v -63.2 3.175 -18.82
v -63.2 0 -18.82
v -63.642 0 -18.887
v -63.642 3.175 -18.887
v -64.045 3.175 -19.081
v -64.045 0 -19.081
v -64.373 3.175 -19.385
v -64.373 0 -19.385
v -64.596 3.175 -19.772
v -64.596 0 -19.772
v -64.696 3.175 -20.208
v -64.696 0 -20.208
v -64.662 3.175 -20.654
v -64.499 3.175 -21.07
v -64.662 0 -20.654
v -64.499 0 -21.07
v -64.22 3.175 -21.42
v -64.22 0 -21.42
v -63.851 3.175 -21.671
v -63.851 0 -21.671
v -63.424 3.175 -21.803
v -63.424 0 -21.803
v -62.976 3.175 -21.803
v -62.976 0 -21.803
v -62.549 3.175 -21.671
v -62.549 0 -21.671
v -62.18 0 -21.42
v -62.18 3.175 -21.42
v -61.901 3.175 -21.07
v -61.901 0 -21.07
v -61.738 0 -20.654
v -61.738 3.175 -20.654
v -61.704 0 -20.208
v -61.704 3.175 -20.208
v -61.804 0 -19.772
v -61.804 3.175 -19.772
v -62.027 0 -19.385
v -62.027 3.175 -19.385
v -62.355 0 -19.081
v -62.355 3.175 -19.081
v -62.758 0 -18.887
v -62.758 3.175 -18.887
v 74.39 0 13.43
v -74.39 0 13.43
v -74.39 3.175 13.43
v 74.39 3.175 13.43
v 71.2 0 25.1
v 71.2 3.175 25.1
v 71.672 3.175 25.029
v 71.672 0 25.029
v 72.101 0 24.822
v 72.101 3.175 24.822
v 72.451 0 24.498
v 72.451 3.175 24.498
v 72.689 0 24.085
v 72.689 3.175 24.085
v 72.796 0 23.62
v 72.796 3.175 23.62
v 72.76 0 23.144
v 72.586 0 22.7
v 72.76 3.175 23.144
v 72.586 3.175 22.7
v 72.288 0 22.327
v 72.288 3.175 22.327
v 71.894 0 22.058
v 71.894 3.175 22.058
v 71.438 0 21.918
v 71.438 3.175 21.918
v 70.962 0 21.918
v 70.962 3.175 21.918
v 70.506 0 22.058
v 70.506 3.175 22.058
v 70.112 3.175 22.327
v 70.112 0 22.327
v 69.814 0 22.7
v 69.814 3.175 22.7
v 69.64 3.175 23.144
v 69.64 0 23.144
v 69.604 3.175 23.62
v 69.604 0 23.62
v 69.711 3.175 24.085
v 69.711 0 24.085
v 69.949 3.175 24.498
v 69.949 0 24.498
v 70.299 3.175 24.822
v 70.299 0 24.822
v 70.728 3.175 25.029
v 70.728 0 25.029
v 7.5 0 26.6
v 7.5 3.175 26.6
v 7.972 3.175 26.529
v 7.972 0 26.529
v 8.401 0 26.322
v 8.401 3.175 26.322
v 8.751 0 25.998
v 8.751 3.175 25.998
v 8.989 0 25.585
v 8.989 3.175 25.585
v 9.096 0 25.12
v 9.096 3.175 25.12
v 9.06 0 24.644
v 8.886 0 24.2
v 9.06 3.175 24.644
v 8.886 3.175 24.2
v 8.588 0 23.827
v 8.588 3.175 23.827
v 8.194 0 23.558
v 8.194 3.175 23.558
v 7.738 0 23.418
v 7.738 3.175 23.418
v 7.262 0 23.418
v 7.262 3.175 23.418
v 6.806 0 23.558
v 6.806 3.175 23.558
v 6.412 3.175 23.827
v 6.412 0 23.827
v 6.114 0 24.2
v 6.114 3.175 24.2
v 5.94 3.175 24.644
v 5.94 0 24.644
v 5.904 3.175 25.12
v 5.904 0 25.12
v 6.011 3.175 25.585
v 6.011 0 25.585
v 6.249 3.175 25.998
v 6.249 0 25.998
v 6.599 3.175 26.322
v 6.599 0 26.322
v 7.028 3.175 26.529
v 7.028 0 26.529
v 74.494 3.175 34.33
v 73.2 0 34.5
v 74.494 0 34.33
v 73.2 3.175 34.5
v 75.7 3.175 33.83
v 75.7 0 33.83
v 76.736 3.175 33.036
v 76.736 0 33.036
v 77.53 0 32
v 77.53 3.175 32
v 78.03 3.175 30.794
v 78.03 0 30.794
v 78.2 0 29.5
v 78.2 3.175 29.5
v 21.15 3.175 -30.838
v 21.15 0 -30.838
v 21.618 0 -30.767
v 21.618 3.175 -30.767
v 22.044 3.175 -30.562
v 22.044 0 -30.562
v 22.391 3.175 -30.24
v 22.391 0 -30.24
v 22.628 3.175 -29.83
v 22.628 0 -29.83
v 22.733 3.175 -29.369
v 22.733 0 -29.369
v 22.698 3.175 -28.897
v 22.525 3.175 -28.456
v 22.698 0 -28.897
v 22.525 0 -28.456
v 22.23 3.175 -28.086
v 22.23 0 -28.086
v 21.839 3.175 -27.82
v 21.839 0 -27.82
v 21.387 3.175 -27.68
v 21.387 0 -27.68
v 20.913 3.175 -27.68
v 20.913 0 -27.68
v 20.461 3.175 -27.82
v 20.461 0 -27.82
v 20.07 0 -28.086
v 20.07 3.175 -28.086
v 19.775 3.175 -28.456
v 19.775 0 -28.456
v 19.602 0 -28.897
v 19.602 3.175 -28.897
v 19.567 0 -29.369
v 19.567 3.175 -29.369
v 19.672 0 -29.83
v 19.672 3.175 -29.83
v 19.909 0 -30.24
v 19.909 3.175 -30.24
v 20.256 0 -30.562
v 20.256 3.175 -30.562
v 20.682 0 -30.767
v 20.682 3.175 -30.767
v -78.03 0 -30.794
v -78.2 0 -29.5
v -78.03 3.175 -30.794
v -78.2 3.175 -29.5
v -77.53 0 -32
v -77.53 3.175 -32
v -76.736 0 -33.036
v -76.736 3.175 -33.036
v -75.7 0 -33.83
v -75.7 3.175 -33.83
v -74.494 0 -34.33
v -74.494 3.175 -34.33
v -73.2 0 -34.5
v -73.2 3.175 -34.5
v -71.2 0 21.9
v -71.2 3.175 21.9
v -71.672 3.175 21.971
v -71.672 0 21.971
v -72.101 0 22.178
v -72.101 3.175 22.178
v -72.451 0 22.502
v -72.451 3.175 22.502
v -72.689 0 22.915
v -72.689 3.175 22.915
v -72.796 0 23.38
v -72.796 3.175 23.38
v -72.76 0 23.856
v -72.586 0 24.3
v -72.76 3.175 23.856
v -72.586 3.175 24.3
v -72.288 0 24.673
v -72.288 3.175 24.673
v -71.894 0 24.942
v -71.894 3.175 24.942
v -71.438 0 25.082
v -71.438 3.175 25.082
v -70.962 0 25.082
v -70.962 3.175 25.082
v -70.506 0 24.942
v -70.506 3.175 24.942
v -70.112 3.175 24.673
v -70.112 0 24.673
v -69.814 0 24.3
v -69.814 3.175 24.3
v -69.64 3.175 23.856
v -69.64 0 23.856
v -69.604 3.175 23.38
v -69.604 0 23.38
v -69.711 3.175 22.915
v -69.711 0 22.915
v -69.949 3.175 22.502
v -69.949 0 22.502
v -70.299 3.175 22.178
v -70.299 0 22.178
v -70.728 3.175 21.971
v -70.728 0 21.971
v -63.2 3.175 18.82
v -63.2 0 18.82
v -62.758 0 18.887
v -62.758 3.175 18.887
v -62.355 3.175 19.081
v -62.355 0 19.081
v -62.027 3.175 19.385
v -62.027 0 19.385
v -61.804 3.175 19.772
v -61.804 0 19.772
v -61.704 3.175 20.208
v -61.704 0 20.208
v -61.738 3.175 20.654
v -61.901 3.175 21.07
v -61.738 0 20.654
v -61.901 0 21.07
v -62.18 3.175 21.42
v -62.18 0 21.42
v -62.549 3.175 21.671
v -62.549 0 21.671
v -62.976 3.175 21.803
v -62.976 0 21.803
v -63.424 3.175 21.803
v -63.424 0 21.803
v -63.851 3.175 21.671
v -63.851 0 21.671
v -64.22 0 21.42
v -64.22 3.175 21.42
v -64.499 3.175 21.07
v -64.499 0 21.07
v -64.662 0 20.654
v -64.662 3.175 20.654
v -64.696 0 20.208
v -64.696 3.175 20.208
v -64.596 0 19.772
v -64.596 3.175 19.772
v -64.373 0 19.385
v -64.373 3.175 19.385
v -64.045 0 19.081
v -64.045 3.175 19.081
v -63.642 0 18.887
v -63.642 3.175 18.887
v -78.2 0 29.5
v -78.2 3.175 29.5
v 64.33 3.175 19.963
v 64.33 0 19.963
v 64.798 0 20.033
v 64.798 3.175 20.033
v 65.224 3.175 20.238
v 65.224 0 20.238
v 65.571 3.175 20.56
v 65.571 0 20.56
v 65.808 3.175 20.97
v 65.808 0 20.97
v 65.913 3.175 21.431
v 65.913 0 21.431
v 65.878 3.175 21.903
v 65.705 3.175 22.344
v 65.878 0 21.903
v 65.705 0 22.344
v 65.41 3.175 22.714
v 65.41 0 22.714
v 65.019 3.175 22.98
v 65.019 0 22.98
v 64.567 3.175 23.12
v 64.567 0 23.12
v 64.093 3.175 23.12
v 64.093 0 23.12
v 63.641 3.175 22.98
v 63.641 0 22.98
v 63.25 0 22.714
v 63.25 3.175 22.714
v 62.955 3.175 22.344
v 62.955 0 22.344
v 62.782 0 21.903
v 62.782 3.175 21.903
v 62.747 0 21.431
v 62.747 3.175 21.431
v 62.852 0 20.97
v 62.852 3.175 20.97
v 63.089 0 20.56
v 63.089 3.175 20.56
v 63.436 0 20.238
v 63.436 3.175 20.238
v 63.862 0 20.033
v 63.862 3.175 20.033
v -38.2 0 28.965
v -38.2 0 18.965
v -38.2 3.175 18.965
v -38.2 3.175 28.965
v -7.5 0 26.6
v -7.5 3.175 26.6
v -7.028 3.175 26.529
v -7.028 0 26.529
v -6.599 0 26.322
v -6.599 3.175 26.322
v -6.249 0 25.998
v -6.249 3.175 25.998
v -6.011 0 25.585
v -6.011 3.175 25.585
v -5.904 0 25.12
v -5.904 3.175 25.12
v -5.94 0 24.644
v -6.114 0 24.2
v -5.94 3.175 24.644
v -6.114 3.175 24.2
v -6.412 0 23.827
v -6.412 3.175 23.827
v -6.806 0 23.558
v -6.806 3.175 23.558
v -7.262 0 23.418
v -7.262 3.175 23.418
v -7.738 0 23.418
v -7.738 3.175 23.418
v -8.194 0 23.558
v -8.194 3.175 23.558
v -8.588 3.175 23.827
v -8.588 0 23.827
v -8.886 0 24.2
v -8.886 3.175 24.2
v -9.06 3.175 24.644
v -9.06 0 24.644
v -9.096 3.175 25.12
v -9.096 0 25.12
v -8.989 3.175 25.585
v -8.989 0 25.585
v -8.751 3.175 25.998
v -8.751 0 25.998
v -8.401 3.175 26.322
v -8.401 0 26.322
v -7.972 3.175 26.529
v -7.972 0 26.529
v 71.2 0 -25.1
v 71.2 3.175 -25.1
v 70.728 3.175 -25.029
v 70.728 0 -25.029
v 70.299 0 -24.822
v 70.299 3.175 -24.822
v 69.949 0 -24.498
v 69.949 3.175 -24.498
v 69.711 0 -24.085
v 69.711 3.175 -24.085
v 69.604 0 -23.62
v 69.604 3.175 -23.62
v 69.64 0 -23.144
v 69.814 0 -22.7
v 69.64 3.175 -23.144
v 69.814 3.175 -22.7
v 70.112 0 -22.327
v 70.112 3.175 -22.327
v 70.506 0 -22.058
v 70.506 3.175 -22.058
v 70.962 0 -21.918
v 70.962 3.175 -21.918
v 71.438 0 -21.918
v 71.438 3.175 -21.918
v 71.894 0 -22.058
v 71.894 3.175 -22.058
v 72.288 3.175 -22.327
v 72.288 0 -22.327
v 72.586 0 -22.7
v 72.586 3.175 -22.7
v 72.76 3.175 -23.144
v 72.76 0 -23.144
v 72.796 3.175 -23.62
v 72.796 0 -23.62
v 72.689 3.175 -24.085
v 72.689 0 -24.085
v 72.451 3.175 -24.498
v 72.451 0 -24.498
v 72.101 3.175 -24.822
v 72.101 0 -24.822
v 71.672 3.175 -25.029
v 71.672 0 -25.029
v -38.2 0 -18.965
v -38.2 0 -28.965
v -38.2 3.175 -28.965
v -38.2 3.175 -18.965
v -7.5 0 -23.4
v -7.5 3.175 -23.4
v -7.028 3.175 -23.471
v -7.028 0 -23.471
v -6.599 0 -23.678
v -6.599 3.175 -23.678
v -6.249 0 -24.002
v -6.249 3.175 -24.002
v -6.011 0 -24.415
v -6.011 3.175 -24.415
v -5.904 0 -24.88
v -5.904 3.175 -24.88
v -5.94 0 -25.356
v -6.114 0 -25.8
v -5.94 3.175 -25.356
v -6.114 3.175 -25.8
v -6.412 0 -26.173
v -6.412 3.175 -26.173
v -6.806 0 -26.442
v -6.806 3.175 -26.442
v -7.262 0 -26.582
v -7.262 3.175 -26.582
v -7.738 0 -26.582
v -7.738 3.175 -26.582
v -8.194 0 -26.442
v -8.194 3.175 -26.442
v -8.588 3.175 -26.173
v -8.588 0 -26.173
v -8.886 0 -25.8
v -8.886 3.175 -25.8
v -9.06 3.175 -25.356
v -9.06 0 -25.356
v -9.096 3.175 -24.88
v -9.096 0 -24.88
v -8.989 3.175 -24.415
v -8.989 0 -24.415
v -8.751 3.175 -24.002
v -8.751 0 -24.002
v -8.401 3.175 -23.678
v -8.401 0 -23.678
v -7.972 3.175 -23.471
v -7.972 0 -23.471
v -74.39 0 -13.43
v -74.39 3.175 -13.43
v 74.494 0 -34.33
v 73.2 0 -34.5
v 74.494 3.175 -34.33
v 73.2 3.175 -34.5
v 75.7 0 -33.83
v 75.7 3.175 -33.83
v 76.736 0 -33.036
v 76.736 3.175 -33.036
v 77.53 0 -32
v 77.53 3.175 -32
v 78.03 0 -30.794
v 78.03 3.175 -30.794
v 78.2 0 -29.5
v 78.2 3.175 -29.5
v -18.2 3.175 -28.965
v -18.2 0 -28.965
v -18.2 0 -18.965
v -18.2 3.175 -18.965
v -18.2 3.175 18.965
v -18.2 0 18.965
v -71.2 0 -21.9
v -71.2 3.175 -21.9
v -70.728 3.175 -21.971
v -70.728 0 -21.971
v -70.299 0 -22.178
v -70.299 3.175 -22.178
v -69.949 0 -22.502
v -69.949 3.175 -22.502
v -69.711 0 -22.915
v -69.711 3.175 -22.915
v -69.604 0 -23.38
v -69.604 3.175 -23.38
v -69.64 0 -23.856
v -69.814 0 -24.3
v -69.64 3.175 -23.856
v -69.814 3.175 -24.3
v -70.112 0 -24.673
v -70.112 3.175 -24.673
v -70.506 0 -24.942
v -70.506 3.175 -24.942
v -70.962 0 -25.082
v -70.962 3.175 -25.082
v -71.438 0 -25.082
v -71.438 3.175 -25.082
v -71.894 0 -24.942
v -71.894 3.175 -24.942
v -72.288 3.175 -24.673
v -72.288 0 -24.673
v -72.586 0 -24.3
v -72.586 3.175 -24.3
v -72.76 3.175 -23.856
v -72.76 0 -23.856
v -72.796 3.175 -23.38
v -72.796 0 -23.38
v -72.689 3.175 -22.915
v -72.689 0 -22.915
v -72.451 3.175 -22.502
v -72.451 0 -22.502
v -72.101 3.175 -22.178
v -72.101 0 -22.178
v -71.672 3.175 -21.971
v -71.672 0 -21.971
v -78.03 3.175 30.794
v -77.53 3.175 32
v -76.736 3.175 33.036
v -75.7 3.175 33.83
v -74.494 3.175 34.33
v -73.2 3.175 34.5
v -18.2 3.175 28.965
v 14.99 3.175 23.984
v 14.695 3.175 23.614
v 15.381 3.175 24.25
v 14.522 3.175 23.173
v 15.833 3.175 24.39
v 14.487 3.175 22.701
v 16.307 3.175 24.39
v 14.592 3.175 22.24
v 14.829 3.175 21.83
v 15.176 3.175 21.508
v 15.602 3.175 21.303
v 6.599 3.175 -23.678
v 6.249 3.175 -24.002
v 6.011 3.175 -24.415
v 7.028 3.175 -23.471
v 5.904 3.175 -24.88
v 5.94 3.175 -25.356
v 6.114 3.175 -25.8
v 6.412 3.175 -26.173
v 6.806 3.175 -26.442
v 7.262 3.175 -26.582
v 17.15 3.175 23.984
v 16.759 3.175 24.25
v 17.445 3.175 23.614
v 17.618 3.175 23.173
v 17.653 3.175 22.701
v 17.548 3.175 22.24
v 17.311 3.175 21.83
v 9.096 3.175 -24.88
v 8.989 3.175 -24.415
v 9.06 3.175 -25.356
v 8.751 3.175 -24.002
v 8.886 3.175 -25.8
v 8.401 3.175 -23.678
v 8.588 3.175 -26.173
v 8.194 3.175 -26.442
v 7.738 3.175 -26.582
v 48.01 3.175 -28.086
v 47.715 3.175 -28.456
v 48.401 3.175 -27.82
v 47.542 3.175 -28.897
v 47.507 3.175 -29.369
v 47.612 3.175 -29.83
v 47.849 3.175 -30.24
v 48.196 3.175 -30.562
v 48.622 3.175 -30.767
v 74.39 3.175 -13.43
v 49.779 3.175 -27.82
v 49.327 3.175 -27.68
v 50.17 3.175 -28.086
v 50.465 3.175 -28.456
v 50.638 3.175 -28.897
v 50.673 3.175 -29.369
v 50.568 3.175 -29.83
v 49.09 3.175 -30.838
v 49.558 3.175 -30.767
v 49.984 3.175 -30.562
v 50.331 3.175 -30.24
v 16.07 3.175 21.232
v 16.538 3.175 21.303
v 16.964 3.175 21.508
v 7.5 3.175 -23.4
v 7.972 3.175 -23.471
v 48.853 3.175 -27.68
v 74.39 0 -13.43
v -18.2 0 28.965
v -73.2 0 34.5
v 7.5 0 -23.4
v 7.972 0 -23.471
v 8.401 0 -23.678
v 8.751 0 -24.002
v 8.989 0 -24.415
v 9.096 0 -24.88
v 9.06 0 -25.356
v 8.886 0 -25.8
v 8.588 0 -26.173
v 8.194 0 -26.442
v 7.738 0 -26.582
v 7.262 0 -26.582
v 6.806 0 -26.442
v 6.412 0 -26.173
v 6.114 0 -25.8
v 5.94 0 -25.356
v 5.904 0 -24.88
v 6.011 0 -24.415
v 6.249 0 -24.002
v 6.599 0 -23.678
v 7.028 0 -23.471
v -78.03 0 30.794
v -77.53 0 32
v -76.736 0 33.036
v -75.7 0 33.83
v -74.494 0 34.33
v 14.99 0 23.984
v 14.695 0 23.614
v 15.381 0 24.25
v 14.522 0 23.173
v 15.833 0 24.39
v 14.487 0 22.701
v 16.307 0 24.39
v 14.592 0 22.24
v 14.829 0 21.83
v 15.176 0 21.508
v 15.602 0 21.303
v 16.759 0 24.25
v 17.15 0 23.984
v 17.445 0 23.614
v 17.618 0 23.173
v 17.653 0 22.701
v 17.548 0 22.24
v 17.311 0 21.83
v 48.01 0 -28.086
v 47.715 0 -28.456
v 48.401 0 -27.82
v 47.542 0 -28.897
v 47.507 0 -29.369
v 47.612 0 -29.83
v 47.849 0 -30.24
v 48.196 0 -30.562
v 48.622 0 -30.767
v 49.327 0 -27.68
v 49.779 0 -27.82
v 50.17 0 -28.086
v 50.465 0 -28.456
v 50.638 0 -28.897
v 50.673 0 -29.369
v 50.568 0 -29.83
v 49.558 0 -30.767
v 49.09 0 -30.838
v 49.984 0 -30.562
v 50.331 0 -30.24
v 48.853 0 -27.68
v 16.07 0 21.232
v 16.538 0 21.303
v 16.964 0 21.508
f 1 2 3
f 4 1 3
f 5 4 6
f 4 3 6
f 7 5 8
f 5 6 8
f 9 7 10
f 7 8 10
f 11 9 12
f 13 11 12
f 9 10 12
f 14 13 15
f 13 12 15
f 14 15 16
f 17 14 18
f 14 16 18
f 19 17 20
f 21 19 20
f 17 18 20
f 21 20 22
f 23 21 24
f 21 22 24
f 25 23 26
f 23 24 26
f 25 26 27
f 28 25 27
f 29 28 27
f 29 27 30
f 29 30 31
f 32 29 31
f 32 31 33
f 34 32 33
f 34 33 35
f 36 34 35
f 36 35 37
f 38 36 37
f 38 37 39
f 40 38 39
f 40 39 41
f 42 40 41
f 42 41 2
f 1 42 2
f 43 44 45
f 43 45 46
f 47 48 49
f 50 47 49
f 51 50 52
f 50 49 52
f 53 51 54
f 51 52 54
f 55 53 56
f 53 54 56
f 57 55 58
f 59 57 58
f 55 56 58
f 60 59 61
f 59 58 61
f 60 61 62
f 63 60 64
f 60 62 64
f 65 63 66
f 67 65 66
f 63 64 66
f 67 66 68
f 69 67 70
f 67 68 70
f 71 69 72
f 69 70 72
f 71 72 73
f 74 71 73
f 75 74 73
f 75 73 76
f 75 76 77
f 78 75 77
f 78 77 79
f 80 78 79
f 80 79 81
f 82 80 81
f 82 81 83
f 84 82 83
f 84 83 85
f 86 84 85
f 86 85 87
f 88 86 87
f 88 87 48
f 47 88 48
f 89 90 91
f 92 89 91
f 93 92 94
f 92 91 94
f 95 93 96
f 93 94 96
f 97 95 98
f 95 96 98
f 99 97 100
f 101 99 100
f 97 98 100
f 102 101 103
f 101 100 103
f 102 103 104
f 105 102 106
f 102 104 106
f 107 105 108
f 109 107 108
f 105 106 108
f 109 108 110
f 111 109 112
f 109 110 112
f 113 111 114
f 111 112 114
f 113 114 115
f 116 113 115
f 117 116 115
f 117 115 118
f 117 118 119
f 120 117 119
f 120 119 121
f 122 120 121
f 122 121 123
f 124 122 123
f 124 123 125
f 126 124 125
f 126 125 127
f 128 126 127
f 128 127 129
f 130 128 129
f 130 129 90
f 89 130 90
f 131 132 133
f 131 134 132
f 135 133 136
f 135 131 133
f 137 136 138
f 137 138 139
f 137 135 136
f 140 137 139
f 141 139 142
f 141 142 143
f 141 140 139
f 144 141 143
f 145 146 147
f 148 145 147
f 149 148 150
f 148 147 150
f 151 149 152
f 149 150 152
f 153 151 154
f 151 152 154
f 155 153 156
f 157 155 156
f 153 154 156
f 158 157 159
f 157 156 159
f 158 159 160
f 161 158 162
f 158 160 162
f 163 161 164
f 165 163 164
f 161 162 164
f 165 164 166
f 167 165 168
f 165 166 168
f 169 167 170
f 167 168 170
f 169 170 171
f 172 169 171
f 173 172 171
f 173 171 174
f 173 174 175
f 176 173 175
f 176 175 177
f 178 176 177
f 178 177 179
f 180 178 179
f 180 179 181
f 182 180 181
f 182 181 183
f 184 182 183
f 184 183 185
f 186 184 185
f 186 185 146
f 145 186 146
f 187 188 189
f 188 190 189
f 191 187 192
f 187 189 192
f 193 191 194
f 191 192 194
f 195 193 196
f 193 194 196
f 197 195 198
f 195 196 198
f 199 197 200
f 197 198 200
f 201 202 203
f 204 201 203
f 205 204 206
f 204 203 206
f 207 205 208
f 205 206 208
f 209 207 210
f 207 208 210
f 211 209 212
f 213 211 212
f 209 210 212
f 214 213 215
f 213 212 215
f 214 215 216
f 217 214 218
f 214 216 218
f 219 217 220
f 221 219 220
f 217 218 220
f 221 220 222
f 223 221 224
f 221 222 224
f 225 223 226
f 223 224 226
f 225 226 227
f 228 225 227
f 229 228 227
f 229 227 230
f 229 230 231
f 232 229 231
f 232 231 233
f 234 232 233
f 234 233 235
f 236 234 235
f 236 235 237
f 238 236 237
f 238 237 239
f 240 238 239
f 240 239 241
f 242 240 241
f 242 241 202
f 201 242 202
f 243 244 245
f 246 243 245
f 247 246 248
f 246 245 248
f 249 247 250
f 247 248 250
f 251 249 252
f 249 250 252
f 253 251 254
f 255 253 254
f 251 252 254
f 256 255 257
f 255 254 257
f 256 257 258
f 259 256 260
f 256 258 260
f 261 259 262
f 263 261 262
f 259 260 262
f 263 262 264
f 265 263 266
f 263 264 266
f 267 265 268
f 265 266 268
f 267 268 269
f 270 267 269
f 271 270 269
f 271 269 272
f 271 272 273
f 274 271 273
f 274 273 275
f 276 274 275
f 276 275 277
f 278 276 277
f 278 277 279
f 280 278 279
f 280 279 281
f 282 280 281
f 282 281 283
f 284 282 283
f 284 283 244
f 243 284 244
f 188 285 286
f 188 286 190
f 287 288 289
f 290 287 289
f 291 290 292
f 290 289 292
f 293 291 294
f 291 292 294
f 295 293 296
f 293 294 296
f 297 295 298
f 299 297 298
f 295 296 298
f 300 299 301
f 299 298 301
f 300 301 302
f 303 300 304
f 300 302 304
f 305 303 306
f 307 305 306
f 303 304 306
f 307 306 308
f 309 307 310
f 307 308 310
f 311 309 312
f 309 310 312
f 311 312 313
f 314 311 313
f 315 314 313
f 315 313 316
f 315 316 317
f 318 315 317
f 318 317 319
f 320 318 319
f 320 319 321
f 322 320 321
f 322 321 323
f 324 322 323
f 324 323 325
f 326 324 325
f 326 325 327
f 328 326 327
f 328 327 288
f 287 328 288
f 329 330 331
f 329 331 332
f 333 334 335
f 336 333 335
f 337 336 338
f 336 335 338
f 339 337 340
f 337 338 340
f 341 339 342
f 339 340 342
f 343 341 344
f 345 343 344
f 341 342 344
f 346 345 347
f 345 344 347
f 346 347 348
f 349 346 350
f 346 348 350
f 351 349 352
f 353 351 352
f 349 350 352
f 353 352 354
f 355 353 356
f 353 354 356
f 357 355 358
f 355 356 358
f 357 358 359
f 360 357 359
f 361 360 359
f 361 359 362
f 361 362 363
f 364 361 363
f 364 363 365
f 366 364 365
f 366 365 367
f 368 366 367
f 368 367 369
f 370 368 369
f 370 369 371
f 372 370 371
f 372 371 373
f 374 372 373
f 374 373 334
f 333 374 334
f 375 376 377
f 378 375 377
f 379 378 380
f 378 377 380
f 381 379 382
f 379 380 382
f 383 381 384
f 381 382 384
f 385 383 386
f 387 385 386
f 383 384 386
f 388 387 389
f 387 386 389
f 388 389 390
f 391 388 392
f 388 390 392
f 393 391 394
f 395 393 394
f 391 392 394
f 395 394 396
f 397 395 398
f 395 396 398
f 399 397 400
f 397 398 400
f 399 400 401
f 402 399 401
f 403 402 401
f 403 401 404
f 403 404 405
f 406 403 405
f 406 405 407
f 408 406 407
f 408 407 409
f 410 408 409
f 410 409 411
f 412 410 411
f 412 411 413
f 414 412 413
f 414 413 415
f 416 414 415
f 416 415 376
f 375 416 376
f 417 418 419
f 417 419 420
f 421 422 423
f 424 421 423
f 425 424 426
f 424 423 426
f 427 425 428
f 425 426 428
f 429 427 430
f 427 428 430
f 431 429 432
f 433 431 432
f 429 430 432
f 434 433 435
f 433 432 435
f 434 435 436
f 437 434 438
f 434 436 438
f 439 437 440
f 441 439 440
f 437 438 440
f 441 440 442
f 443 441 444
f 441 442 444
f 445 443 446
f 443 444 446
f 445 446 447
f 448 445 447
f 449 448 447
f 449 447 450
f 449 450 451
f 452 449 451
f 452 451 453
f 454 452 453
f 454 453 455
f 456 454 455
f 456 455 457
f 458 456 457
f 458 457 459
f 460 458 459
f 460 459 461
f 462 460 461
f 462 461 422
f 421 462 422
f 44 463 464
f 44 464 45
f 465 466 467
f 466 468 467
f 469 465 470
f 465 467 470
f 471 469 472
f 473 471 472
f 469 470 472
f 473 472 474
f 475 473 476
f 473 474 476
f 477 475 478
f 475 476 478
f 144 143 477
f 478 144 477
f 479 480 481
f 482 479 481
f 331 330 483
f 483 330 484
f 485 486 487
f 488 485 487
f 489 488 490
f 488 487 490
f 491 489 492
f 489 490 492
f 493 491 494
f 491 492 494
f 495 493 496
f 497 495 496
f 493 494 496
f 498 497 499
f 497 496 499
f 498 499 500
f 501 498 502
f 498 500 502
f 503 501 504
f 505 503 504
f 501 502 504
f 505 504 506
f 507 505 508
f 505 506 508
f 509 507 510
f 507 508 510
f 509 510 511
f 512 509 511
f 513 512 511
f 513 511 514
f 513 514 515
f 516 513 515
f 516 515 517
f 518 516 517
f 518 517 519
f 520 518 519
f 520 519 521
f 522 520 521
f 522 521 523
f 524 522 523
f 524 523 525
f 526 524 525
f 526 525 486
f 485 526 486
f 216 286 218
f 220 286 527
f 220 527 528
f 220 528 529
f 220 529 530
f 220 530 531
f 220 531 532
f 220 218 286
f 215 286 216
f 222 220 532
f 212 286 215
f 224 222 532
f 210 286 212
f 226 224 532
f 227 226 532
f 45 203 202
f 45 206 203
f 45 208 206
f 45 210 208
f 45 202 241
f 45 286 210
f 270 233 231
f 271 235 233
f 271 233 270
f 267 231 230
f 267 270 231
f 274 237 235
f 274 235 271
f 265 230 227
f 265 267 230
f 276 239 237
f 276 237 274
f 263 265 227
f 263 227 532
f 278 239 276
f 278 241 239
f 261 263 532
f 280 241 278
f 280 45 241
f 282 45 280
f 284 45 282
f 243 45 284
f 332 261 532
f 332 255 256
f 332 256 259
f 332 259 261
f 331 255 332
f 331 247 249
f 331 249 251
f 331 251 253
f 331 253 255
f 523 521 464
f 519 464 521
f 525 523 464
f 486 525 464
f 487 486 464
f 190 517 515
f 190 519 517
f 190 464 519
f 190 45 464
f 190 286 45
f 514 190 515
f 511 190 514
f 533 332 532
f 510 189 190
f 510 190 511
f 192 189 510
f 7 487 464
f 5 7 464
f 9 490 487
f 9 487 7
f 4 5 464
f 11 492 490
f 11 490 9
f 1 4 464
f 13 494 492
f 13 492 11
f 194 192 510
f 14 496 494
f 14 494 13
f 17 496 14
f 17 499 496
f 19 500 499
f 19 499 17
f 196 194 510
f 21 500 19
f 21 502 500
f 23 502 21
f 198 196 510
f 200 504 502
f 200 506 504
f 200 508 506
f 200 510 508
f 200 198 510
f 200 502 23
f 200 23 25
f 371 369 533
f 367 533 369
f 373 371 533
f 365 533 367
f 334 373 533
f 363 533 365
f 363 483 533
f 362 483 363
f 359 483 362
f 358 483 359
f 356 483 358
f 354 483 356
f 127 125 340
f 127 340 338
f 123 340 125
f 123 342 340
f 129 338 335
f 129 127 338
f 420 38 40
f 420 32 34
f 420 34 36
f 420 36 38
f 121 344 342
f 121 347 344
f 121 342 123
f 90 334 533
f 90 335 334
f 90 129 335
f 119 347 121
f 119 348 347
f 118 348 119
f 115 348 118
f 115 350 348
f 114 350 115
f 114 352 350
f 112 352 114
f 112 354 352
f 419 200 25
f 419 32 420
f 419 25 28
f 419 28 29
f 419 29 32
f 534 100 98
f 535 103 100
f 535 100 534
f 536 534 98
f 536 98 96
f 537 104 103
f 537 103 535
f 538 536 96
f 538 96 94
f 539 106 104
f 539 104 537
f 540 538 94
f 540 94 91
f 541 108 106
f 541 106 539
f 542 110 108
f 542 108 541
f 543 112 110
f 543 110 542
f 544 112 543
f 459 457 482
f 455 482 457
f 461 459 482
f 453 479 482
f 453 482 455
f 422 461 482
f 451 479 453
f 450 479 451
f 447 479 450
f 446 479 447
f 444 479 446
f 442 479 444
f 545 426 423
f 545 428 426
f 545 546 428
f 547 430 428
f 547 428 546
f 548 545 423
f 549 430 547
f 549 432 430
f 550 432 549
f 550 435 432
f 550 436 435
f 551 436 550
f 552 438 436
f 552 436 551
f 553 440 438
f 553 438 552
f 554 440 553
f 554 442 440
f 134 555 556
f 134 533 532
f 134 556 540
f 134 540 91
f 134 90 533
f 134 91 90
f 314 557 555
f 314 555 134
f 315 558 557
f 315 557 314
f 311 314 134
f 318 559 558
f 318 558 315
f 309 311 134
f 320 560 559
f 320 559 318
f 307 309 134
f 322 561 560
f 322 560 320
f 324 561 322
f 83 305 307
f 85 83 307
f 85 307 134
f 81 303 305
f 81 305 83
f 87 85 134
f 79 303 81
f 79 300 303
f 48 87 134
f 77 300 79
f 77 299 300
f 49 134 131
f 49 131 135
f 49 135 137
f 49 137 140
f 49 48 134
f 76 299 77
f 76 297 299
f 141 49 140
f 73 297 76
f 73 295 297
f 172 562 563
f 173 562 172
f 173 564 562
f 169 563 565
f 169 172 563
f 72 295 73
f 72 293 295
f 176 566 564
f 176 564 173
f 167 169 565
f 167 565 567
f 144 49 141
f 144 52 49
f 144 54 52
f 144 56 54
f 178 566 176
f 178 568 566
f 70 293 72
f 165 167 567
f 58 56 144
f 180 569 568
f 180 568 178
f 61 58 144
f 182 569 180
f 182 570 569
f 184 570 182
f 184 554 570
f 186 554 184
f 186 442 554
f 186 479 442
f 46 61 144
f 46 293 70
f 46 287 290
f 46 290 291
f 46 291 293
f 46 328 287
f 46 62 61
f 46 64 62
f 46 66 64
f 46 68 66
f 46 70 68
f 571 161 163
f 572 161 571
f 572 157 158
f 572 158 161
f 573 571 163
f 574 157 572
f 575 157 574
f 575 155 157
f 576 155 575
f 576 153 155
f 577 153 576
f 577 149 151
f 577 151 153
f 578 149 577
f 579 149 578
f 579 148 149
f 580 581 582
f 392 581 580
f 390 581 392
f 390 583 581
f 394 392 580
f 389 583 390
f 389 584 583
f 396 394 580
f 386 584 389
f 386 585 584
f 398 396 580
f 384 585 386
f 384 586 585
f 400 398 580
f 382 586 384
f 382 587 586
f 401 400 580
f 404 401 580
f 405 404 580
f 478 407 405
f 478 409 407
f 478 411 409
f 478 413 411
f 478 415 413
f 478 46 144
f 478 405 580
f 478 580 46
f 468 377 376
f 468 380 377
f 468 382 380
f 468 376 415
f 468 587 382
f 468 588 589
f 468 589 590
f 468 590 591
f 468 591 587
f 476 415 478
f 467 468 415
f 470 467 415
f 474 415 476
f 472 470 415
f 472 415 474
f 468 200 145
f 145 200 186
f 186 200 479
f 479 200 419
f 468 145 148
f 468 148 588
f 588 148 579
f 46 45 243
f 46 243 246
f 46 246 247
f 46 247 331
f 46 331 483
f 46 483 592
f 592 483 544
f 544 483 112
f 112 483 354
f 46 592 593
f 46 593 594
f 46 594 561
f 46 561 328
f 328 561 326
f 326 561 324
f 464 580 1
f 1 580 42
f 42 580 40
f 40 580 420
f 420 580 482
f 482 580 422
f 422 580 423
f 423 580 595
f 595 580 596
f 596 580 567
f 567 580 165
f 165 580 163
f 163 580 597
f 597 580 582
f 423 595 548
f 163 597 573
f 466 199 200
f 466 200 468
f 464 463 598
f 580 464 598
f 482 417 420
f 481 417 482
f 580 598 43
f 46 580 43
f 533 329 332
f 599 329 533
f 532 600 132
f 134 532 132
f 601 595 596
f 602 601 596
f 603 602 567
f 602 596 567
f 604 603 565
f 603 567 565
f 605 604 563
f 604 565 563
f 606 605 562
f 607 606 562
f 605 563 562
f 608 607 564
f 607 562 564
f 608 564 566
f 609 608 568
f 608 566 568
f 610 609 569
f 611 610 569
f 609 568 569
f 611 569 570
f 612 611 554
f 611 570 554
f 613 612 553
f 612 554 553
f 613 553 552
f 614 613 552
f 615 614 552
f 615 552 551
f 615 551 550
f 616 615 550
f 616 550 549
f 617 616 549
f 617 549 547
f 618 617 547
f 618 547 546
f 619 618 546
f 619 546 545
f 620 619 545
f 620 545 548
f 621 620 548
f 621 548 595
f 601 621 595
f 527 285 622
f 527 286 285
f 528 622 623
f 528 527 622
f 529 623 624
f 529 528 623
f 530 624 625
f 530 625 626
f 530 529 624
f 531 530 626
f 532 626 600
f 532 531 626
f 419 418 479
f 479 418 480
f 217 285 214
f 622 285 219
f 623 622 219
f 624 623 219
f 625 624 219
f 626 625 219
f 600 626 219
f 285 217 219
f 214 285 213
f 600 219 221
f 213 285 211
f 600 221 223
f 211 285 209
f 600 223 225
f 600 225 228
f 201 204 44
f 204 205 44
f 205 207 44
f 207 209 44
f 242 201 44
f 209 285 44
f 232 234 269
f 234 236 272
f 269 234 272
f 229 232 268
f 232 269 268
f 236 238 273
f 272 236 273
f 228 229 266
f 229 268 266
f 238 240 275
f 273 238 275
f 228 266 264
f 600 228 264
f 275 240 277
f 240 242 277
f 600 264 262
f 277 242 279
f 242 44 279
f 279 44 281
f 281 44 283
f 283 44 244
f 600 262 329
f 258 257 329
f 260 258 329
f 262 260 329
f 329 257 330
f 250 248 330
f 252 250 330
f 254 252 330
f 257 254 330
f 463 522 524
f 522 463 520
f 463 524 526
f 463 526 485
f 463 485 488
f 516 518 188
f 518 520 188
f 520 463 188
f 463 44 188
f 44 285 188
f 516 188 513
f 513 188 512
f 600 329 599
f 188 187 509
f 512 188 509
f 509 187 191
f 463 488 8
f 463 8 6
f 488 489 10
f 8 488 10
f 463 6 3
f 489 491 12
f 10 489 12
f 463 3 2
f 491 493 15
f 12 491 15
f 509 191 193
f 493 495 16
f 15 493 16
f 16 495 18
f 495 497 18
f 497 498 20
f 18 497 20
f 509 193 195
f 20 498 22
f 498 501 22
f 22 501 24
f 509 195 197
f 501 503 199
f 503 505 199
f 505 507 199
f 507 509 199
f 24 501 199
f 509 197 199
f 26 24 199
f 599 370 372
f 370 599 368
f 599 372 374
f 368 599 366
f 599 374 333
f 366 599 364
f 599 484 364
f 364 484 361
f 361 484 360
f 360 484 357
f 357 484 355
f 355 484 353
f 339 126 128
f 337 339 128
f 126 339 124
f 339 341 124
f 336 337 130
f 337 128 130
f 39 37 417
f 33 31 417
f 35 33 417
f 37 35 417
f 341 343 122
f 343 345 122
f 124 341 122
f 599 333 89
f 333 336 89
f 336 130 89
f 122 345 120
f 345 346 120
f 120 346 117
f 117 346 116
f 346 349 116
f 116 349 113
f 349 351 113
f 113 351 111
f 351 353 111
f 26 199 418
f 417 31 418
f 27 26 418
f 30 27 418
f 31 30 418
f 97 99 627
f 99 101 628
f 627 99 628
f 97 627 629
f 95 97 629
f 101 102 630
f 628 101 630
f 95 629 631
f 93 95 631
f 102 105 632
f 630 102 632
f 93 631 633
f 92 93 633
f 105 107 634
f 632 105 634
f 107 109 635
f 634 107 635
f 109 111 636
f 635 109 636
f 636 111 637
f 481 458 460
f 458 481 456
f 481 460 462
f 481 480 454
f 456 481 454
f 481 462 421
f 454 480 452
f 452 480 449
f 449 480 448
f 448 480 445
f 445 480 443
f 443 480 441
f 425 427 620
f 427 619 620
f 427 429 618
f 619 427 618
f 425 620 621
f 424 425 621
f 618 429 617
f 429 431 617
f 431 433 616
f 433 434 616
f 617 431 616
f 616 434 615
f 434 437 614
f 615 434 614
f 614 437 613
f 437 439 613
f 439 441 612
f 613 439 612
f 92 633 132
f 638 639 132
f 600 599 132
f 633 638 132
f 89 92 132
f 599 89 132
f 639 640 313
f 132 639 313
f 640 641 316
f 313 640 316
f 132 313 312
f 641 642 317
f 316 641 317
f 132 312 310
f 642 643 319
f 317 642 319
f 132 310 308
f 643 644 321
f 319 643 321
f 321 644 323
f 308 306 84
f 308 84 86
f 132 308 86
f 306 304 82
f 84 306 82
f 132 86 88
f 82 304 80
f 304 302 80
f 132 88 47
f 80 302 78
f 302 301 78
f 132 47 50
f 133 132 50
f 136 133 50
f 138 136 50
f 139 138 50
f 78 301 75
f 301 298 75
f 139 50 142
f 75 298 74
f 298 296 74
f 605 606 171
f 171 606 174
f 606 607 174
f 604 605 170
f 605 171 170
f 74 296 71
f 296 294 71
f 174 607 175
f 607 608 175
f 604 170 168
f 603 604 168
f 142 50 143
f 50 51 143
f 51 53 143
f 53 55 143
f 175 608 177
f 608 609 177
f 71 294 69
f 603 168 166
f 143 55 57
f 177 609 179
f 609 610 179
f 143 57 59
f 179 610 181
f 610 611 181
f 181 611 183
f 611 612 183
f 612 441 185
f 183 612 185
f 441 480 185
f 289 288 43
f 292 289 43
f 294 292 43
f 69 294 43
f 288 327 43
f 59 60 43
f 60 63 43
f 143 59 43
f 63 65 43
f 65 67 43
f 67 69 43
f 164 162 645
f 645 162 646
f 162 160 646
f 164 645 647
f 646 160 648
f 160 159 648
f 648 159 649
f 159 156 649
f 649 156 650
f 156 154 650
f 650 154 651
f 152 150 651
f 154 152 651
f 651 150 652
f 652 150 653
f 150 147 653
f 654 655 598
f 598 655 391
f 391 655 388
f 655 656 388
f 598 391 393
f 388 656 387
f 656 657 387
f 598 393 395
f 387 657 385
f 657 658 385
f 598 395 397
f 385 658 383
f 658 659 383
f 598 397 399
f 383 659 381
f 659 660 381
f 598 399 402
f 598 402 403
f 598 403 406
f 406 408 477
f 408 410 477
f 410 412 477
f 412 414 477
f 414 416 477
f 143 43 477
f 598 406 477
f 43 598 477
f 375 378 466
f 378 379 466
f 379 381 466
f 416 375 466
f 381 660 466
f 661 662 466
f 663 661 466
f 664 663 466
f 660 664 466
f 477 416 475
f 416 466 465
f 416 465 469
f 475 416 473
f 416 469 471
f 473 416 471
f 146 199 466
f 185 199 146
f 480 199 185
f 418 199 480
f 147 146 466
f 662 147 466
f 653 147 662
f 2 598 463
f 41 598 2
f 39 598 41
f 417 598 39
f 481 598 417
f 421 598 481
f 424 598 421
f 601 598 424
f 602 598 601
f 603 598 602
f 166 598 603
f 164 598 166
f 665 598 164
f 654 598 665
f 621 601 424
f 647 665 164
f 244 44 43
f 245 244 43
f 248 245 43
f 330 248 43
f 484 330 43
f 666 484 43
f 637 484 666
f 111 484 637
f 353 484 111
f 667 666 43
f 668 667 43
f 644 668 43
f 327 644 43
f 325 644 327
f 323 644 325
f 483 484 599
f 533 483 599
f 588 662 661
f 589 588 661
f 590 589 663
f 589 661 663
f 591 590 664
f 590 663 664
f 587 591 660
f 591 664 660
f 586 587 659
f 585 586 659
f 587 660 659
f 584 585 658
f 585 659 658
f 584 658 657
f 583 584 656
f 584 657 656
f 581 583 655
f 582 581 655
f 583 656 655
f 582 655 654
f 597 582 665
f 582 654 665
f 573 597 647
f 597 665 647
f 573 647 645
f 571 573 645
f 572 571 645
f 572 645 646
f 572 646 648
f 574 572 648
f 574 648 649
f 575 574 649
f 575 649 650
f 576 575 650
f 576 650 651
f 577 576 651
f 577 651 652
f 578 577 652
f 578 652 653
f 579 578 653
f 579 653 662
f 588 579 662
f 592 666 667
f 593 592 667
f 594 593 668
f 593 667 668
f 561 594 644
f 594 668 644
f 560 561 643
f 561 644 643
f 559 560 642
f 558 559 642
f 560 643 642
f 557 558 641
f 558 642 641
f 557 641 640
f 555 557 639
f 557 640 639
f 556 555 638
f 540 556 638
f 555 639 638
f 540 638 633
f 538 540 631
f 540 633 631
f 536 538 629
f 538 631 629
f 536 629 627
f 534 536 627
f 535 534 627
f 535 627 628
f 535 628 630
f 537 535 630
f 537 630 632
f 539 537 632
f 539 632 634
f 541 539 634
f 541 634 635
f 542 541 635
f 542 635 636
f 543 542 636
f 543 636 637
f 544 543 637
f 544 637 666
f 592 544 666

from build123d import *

# Parameters (mm, degrees)
SKETCH2_W           = 156.4
SKETCH2_H           = 69
BOSS_EXTRUDE1_DEPTH = 3.175
SKETCH4_R           = 1.6
CUT_EXTRUDE1_DEPTH  = 86.531109107
SKETCH6_R           = 1.5875
CUT_EXTRUDE2_DEPTH  = 86.531109107
SKETCH7_R           = 1.5
CUT_EXTRUDE3_DEPTH  = 86.531109107
SKETCH8_W           = 146.78
SKETCH8_H           = 24.86
CUT_EXTRUDE4_DEPTH  = 86.531109107
SKETCH10_R          = 1.6
CUT_EXTRUDE6_DEPTH  = 86.531109107
SKETCH11_W          = 148.78
SKETCH11_H          = 26.86
CUT_EXTRUDE7_DEPTH  = 86.531109107
SKETCH12_W          = 20
SKETCH12_H          = 10
CUT_EXTRUDE8_DEPTH  = 86.531109107
FILLET1_R           = 5


with BuildPart() as part:
    # Sketch2 → Boss-Extrude1 (new body)
    with BuildSketch(Plane(origin=(0, 0, 0), x_dir=(1, 0, 0), z_dir=(0, 1, 0))):
        Rectangle(SKETCH2_W, SKETCH2_H)
    extrude(amount=BOSS_EXTRUDE1_DEPTH)

    # Sketch4 → Cut-Extrude1 (cut, through all)
    with BuildSketch(Plane(origin=(0, 3.175, 0), x_dir=(1, 0, 0), z_dir=(0, 1, 0))):
        with Locations(Location((71.2, -23.5, 0), (0, 0, 270))):
            Circle(SKETCH4_R)
        with Locations(Location((71.2, 23.5, 0), (0, 0, 90))):
            Circle(SKETCH4_R)
        with Locations(Location((-71.2, 23.5, 0), (0, 0, 270))):
            Circle(SKETCH4_R)
        with Locations(Location((-71.2, -23.5, 0), (0, 0, 90))):
            Circle(SKETCH4_R)
    extrude(amount=-CUT_EXTRUDE1_DEPTH, mode=Mode.SUBTRACT)

    # Sketch6 → Cut-Extrude2 (cut, through all)
    with BuildSketch(Plane.XZ):
        with Locations(Location((49.09, -29.25, 0), (0, 0, 270))):
            Circle(SKETCH6_R)
        with Locations(Location((21.15, -29.25, 0), (0, 0, 270))):
            Circle(SKETCH6_R)
        with Locations(Location((64.33, 21.55, 0), (0, 0, 270))):
            Circle(SKETCH6_R)
        with Locations(Location((16.07, 22.82, 0), (0, 0, 270))):
            Circle(SKETCH6_R)
    extrude(amount=-CUT_EXTRUDE2_DEPTH, mode=Mode.SUBTRACT)

    # Sketch7 → Cut-Extrude3 (cut, through all)
    with BuildSketch(Plane(origin=(0, 0, 0), x_dir=(-1, 0, 0), z_dir=(0, -1, 0))):
        with Locations(Location((63.2, -20.32, 0), (0, 0, 90))):
            Circle(SKETCH7_R)
        with Locations(Location((63.2, 20.32, 0), (0, 0, 270))):
            Circle(SKETCH7_R)
    extrude(amount=-CUT_EXTRUDE3_DEPTH, mode=Mode.SUBTRACT)

    # Sketch8 → Cut-Extrude4 (cut, through all)
    with BuildSketch(Plane.XZ):
        Rectangle(SKETCH8_W, SKETCH8_H)
    extrude(amount=-CUT_EXTRUDE4_DEPTH, mode=Mode.SUBTRACT)

    # Sketch10 → Cut-Extrude6 (cut, through all)
    with BuildSketch(Plane(origin=(0, 3.175, 0), x_dir=(1, 0, 0), z_dir=(0, 1, 0))):
        with Locations(Location((-7.5, -25, 0), (0, 0, 270))):
            Circle(SKETCH10_R)
        with Locations(Location((7.5, -25, 0), (0, 0, 270))):
            Circle(SKETCH10_R)
        with Locations(Location((7.5, 25, 0), (0, 0, 270))):
            Circle(SKETCH10_R)
        with Locations(Location((-7.5, 25, 0), (0, 0, 270))):
            Circle(SKETCH10_R)
    extrude(amount=-CUT_EXTRUDE6_DEPTH, mode=Mode.SUBTRACT)

    # Sketch11 → Cut-Extrude7 (cut, through all)
    with BuildSketch(Plane.XZ):
        Rectangle(SKETCH11_W, SKETCH11_H)
    extrude(amount=-CUT_EXTRUDE7_DEPTH, mode=Mode.SUBTRACT)

    # Sketch12 → Cut-Extrude8 (cut, through all)
    with BuildSketch(Plane.XZ):
        with Locations((-28.2, -23.965)):
            Rectangle(SKETCH12_W, SKETCH12_H)
        with Locations((-28.2, 23.965)):
            Rectangle(SKETCH12_W, SKETCH12_H)
    extrude(amount=-CUT_EXTRUDE8_DEPTH, mode=Mode.SUBTRACT)

    # Fillet1
    fillet1_edges = [part.edges().sort_by_distance(p)[0] for p in [
        (78.2, 1.5875, 34.5),
        (-78.2, 1.5875, 34.5),
        (-78.2, 1.5875, -34.5),
        (78.2, 1.5875, -34.5),
    ]]
    fillet(fillet1_edges, radius=FILLET1_R)


solid = part.part
